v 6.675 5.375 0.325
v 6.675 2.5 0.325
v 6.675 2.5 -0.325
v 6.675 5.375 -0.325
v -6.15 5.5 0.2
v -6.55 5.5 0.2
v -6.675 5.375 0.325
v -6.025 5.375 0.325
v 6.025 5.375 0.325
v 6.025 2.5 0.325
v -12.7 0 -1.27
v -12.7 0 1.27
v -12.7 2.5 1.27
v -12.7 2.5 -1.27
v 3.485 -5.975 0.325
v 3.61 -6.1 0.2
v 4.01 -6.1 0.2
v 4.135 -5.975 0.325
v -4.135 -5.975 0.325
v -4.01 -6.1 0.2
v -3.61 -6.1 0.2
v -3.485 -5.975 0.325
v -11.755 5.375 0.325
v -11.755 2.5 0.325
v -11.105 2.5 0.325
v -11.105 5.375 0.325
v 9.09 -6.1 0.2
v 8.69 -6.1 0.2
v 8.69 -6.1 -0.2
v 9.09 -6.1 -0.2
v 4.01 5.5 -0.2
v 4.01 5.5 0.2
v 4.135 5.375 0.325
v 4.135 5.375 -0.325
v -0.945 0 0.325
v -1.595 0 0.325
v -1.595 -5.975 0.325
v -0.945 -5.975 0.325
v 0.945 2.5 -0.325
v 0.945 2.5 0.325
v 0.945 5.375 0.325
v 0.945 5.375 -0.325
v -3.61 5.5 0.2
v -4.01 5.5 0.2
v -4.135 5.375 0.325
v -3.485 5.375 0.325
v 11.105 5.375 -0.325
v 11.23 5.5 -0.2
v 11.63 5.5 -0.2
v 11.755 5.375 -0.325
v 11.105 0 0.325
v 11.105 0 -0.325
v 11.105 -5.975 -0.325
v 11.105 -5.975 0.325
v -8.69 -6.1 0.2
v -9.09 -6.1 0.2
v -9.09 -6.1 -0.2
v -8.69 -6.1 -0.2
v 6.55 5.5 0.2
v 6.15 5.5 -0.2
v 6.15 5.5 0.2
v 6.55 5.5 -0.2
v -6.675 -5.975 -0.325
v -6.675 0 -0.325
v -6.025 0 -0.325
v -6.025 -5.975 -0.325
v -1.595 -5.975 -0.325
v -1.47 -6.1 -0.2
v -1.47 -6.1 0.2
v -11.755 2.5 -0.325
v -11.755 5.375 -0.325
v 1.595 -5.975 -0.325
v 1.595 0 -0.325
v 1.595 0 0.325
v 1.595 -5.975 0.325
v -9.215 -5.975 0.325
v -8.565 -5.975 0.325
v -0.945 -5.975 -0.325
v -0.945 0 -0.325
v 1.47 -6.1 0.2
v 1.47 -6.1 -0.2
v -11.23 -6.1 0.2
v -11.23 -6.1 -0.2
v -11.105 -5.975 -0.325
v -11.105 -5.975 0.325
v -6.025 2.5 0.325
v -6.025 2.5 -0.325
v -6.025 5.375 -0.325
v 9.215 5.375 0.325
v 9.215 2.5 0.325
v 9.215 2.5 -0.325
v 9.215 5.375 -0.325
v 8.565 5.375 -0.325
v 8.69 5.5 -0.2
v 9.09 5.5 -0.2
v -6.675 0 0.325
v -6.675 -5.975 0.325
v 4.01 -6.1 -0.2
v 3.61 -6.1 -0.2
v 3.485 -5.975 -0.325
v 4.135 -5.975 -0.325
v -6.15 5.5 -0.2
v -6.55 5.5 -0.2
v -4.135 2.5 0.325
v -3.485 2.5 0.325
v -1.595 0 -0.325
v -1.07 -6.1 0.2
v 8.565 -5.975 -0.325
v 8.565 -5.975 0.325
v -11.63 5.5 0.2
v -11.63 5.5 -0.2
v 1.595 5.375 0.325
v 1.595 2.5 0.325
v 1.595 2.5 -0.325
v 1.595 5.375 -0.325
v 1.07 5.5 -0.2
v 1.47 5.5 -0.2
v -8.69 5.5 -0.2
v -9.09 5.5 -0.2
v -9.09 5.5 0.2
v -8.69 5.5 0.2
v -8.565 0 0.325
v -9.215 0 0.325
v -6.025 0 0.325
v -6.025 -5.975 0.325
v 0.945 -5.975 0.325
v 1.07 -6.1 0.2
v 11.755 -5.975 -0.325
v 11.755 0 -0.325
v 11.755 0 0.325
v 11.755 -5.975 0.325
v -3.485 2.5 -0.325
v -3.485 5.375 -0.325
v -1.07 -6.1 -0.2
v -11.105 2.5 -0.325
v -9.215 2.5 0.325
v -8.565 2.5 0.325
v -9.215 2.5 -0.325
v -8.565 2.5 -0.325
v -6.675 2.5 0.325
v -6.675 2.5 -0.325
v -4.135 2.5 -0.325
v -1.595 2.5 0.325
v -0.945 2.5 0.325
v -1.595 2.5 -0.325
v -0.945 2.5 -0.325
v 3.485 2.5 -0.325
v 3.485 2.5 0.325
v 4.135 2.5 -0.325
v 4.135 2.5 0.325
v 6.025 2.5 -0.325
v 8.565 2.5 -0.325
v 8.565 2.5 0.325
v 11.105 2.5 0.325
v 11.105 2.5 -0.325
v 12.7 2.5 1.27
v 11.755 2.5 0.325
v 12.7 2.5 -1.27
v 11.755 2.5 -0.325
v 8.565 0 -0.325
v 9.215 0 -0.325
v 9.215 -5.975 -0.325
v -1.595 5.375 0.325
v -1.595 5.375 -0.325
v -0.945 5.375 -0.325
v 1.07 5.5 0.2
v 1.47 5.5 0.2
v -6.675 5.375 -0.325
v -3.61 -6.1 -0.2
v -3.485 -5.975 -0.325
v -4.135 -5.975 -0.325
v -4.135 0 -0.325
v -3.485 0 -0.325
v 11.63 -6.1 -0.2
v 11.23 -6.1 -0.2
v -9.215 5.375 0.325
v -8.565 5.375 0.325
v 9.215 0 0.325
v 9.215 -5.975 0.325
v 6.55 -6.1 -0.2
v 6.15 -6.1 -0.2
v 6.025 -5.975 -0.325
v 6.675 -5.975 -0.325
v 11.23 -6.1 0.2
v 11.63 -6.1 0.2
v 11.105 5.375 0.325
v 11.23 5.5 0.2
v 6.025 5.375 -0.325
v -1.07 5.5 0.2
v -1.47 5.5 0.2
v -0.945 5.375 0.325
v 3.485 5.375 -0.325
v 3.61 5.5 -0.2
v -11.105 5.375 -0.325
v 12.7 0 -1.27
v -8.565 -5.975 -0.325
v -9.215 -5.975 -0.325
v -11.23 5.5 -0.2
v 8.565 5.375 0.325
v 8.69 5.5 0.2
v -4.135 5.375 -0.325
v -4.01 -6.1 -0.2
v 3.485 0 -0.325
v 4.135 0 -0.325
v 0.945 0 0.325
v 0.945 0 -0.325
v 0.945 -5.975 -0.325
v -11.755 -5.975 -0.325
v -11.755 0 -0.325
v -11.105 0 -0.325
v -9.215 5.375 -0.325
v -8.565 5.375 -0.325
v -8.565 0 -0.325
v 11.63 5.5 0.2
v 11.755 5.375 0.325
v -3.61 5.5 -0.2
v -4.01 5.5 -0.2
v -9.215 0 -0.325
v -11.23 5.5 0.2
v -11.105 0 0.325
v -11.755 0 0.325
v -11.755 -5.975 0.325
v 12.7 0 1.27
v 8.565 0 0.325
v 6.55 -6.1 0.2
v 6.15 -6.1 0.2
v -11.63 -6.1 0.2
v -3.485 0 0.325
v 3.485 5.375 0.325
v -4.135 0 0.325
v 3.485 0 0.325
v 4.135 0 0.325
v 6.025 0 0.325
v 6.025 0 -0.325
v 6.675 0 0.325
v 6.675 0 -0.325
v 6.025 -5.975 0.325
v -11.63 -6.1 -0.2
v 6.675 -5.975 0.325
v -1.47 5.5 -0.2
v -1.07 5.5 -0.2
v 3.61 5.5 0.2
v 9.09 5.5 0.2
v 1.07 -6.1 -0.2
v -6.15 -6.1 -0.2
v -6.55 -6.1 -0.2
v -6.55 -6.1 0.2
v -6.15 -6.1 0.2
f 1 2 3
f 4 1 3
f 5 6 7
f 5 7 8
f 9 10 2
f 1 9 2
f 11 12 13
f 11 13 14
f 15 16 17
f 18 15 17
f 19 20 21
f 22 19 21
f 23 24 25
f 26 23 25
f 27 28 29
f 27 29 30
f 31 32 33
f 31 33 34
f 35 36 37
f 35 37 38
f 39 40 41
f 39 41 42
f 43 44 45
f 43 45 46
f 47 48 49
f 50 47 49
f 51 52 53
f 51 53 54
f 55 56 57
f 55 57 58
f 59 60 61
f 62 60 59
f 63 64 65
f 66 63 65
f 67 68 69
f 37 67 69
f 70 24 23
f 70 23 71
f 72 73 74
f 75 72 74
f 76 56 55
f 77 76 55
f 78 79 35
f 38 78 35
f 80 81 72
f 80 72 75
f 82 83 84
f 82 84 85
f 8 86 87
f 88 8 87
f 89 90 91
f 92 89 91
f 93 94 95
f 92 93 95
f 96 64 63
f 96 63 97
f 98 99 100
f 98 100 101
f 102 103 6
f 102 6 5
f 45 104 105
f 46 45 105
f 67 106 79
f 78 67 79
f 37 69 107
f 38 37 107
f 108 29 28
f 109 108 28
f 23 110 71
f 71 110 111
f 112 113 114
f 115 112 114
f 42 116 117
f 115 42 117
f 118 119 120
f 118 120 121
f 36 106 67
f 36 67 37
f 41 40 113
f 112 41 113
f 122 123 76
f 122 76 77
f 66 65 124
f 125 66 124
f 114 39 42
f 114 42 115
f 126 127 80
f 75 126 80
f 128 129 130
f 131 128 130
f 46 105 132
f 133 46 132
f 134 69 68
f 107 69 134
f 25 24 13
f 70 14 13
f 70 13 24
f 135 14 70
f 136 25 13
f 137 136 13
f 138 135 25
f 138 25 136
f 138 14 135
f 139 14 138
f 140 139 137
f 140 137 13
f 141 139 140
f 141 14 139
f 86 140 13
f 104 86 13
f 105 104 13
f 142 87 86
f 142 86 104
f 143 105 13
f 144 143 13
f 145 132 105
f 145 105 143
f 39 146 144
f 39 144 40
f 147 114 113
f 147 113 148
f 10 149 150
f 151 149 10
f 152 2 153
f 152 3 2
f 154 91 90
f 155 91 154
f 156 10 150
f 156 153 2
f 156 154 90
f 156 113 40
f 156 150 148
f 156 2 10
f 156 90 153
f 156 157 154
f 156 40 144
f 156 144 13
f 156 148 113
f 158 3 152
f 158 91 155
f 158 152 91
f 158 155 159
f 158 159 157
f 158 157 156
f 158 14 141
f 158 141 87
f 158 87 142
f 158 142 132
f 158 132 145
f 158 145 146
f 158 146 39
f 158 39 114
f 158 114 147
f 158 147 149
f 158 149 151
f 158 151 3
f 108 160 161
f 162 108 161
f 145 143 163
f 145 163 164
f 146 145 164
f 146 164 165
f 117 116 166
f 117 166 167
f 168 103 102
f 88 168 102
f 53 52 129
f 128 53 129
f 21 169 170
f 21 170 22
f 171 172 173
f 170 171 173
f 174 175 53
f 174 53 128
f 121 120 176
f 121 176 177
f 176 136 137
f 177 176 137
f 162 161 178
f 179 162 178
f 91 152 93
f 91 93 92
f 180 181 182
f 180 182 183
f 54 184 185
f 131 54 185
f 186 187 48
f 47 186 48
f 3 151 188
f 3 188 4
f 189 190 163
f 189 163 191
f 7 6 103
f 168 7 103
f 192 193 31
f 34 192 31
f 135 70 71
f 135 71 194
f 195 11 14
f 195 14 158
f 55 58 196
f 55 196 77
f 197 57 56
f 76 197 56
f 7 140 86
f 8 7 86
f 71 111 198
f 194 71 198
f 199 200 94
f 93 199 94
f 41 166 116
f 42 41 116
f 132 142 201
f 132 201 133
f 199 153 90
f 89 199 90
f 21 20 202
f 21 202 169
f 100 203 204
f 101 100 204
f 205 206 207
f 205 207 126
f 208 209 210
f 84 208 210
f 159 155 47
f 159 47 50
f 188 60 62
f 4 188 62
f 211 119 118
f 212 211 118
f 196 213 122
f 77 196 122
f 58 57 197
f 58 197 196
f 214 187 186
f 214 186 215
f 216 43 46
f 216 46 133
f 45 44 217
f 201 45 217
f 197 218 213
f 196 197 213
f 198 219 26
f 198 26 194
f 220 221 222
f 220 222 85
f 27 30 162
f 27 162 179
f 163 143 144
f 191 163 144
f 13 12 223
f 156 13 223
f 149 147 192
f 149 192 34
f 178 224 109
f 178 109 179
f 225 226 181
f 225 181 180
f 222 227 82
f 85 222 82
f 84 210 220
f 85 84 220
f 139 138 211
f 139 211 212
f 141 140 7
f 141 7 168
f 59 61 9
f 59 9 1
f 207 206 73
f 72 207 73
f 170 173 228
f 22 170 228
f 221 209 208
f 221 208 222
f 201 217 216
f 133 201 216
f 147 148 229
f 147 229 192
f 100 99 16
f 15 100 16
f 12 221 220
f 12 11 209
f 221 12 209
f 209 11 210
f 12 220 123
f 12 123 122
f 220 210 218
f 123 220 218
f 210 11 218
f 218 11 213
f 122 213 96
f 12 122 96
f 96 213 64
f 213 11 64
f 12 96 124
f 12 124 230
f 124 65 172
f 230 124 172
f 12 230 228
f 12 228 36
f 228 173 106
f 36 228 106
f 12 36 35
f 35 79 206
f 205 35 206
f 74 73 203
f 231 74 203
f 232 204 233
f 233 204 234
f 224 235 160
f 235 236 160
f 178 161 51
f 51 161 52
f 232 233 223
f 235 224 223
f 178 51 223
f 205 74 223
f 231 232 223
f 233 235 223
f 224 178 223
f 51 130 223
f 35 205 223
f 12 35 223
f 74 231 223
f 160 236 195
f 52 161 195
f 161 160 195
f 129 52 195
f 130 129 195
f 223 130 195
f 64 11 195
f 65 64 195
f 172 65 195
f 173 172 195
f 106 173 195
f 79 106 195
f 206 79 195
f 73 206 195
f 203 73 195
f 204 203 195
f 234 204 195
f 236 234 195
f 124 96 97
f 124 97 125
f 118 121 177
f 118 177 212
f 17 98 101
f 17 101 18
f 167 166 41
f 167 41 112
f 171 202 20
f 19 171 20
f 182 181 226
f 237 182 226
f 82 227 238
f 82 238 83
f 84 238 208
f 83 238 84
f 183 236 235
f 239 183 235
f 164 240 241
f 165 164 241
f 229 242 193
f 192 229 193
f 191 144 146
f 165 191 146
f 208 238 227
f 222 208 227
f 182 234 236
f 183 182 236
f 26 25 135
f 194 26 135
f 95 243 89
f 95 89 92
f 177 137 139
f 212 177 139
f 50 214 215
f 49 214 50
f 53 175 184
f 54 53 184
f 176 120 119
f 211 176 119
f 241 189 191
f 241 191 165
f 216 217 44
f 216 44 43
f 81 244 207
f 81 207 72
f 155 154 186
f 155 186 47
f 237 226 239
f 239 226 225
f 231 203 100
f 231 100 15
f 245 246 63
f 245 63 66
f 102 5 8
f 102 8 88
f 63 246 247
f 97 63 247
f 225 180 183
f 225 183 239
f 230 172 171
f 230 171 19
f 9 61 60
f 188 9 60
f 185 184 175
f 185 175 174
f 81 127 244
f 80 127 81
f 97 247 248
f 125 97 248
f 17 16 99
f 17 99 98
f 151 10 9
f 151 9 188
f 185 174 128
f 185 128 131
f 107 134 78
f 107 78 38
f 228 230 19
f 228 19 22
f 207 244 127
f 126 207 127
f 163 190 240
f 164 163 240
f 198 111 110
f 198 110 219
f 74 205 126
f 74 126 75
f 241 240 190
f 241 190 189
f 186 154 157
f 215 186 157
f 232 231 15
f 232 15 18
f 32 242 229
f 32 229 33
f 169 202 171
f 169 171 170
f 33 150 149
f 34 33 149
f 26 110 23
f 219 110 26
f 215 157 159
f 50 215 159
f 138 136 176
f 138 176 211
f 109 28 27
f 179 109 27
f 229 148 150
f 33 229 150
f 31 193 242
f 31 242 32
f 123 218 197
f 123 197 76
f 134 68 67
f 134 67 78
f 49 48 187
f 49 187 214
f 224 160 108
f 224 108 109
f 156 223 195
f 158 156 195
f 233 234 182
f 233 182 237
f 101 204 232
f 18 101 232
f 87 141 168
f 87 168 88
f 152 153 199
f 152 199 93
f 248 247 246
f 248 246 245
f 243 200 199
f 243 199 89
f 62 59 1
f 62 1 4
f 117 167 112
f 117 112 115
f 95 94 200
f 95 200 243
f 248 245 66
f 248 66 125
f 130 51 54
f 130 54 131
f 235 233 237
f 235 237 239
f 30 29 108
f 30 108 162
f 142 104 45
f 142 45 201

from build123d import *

# Parameters (mm, degrees)
SKETCH3_W           = 25.4
SKETCH3_H           = 2.54
BOSS_EXTRUDE1_DEPTH = 2.5
SKETCH4_W           = 0.65
SKETCH4_H           = 0.65
BOSS_EXTRUDE2_DEPTH = 3
SKETCH5_W           = 0.65
SKETCH5_H           = 0.65
BOSS_EXTRUDE3_DEPTH = 6.1
CHAMFER1_SIZE       = 0.125


with BuildPart() as part:
    # Sketch3 → Boss-Extrude1 (new body)
    with BuildSketch(Plane(origin=(0, 0, 0), x_dir=(1, 0, 0), z_dir=(0, 1, 0))):
        Rectangle(SKETCH3_W, SKETCH3_H)
    extrude(amount=BOSS_EXTRUDE1_DEPTH)

    # Sketch4 → Boss-Extrude2 (add)
    with BuildSketch(Plane(origin=(0, 2.5, 0), x_dir=(1, 0, 0), z_dir=(0, 1, 0))):
        with Locations((1.27, 0)):
            Rectangle(SKETCH4_W, SKETCH4_H)
        with Locations((3.81, 0)):
            Rectangle(SKETCH4_W, SKETCH4_H)
        with Locations((6.35, 0)):
            Rectangle(SKETCH4_W, SKETCH4_H)
        with Locations((8.89, 0)):
            Rectangle(SKETCH4_W, SKETCH4_H)
        with Locations((11.43, 0)):
            Rectangle(SKETCH4_W, SKETCH4_H)
        with Locations((-3.81, 0)):
            Rectangle(SKETCH4_W, SKETCH4_H)
        with Locations((-6.35, 0)):
            Rectangle(SKETCH4_W, SKETCH4_H)
        with Locations((-1.27, 0)):
            Rectangle(SKETCH4_W, SKETCH4_H)
        with Locations((-8.89, 0)):
            Rectangle(SKETCH4_W, SKETCH4_H)
        with Locations((-11.43, 0)):
            Rectangle(SKETCH4_W, SKETCH4_H)
    extrude(amount=BOSS_EXTRUDE2_DEPTH)

    # Sketch5 → Boss-Extrude3 (add)
    with BuildSketch(Plane.XZ):
        with Locations((1.27, 0)):
            Rectangle(SKETCH5_W, SKETCH5_H)
        with Locations((3.81, 0)):
            Rectangle(SKETCH5_W, SKETCH5_H)
        with Locations((6.35, 0)):
            Rectangle(SKETCH5_W, SKETCH5_H)
        with Locations((8.89, 0)):
            Rectangle(SKETCH5_W, SKETCH5_H)
        with Locations((11.43, 0)):
            Rectangle(SKETCH5_W, SKETCH5_H)
        with Locations((-3.81, 0)):
            Rectangle(SKETCH5_W, SKETCH5_H)
        with Locations((-6.35, 0)):
            Rectangle(SKETCH5_W, SKETCH5_H)
        with Locations((-1.27, 0)):
            Rectangle(SKETCH5_W, SKETCH5_H)
        with Locations((-8.89, 0)):
            Rectangle(SKETCH5_W, SKETCH5_H)
        with Locations((-11.43, 0)):
            Rectangle(SKETCH5_W, SKETCH5_H)
    extrude(amount=BOSS_EXTRUDE3_DEPTH)

    # Chamfer1
    chamfer1_edges = [part.edges().sort_by_distance(p)[0] for p in [
        (-8.565, 5.5, 0),
        (-8.89, 5.5, -0.325),
        (-9.215, 5.5, 0),
        (-8.89, 5.5, 0.325),
        (-11.105, 5.5, 0),
        (-11.43, 5.5, -0.325),
        (-11.755, 5.5, 0),
        (-11.43, 5.5, 0.325),
        (1.595, -6.1, 0),
        (1.27, -6.1, 0.325),
        (0.945, -6.1, 0),
        (1.27, -6.1, -0.325),
        (4.135, -6.1, 0),
        (3.81, -6.1, 0.325),
        (3.485, -6.1, 0),
        (3.81, -6.1, -0.325),
        (6.675, -6.1, 0),
        (6.35, -6.1, 0.325),
        (6.025, -6.1, 0),
        (6.35, -6.1, -0.325),
        (9.215, -6.1, 0),
        (8.89, -6.1, 0.325),
        (8.565, -6.1, 0),
        (8.89, -6.1, -0.325),
        (1.595, 5.5, 0),
        (1.27, 5.5, -0.325),
        (0.945, 5.5, 0),
        (11.755, -6.1, 0),
        (11.43, -6.1, 0.325),
        (11.105, -6.1, 0),
        (11.43, -6.1, -0.325),
        (1.27, 5.5, 0.325),
        (-3.485, -6.1, 0),
        (-3.81, -6.1, 0.325),
        (-4.135, -6.1, 0),
        (-3.81, -6.1, -0.325),
        (-0.945, -6.1, 0),
        (-1.27, -6.1, 0.325),
        (-1.595, -6.1, 0),
        (-1.27, -6.1, -0.325),
        (-6.025, -6.1, 0),
        (-6.35, -6.1, 0.325),
        (-6.675, -6.1, 0),
        (-6.35, -6.1, -0.325),
        (-8.565, -6.1, 0),
        (-8.89, -6.1, 0.325),
        (-9.215, -6.1, 0),
        (-8.89, -6.1, -0.325),
        (-11.105, -6.1, 0),
        (-11.43, -6.1, 0.325),
        (-11.755, -6.1, 0),
        (-11.43, -6.1, -0.325),
        (-3.485, 5.5, 0),
        (-3.81, 5.5, -0.325),
        (-4.135, 5.5, 0),
        (-3.81, 5.5, 0.325),
        (4.135, 5.5, 0),
        (3.81, 5.5, -0.325),
        (3.485, 5.5, 0),
        (3.81, 5.5, 0.325),
        (6.675, 5.5, 0),
        (6.35, 5.5, -0.325),
        (6.025, 5.5, 0),
        (6.35, 5.5, 0.325),
        (9.215, 5.5, 0),
        (8.89, 5.5, -0.325),
        (8.565, 5.5, 0),
        (8.89, 5.5, 0.325),
        (11.755, 5.5, 0),
        (11.43, 5.5, -0.325),
        (11.105, 5.5, 0),
        (11.43, 5.5, 0.325),
        (-0.945, 5.5, 0),
        (-1.27, 5.5, -0.325),
        (-1.595, 5.5, 0),
        (-1.27, 5.5, 0.325),
        (-6.025, 5.5, 0),
        (-6.35, 5.5, -0.325),
        (-6.675, 5.5, 0),
        (-6.35, 5.5, 0.325),
    ]]
    chamfer(chamfer1_edges, length=CHAMFER1_SIZE)


solid = part.part
